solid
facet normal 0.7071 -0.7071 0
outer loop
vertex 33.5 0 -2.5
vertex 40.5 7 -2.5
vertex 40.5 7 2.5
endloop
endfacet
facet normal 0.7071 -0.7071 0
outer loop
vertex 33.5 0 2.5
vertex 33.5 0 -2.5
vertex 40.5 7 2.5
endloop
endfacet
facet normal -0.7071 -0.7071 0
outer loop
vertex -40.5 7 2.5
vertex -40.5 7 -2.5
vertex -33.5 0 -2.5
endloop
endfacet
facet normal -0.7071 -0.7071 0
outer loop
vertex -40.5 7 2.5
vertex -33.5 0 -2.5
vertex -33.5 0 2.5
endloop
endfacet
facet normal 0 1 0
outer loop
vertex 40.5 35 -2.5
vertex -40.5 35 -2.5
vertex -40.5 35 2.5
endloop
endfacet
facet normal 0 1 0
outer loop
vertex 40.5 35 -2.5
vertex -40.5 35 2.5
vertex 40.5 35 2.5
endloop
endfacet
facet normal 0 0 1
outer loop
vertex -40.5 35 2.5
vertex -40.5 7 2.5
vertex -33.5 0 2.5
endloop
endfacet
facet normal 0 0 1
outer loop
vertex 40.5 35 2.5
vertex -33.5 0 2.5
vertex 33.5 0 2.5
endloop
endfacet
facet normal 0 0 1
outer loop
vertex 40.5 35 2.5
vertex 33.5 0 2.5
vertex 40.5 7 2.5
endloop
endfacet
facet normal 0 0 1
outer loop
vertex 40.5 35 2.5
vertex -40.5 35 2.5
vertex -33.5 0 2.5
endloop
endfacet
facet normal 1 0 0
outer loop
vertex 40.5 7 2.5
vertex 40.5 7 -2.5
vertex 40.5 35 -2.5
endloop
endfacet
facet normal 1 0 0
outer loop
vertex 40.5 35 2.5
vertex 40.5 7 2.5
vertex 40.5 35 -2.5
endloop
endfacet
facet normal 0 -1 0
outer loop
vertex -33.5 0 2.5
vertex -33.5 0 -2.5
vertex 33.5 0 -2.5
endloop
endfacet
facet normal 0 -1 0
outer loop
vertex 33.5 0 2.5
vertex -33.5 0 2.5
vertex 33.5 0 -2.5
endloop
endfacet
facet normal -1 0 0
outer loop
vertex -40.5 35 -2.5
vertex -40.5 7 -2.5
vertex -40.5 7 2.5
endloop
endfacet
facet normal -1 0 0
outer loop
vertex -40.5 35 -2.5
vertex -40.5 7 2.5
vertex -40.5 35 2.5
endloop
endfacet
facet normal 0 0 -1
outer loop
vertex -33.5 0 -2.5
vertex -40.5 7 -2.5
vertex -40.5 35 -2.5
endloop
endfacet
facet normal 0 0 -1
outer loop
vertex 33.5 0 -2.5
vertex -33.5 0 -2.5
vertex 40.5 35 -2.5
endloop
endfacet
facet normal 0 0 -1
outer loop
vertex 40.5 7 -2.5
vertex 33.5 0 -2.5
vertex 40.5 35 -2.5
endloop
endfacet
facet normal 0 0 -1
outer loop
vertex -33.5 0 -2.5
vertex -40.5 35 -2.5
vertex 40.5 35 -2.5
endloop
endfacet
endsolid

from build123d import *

# Parameters (mm, degrees)
SM_START                   = -2.5
SM_BASE_FLANGE_1_OUTLINE_W = 81
SM_BASE_FLANGE_1_OUTLINE_H = 35
SM_BASE_FLANGE_1_DEPTH     = 5
CHAMFER_1_SIZE             = 7


# Read off the part's stored shape, not the designer's step: Базовая кромка1
with BuildPart() as part:
    # Базовая кромка1 outline → Базовая кромка1 (new body)
    with BuildSketch(Plane.XY.offset(SM_START)):
        with Locations((0, 17.5)):
            Rectangle(SM_BASE_FLANGE_1_OUTLINE_W, SM_BASE_FLANGE_1_OUTLINE_H)
    extrude(amount=SM_BASE_FLANGE_1_DEPTH)

    # Фаска1
    chamfer_1_edges = [part.edges().sort_by_distance(p)[0] for p in [
        (40.5, 0, 0),
        (-40.5, 0, 0),
    ]]
    chamfer(chamfer_1_edges, length=CHAMFER_1_SIZE)


solid = part.part
